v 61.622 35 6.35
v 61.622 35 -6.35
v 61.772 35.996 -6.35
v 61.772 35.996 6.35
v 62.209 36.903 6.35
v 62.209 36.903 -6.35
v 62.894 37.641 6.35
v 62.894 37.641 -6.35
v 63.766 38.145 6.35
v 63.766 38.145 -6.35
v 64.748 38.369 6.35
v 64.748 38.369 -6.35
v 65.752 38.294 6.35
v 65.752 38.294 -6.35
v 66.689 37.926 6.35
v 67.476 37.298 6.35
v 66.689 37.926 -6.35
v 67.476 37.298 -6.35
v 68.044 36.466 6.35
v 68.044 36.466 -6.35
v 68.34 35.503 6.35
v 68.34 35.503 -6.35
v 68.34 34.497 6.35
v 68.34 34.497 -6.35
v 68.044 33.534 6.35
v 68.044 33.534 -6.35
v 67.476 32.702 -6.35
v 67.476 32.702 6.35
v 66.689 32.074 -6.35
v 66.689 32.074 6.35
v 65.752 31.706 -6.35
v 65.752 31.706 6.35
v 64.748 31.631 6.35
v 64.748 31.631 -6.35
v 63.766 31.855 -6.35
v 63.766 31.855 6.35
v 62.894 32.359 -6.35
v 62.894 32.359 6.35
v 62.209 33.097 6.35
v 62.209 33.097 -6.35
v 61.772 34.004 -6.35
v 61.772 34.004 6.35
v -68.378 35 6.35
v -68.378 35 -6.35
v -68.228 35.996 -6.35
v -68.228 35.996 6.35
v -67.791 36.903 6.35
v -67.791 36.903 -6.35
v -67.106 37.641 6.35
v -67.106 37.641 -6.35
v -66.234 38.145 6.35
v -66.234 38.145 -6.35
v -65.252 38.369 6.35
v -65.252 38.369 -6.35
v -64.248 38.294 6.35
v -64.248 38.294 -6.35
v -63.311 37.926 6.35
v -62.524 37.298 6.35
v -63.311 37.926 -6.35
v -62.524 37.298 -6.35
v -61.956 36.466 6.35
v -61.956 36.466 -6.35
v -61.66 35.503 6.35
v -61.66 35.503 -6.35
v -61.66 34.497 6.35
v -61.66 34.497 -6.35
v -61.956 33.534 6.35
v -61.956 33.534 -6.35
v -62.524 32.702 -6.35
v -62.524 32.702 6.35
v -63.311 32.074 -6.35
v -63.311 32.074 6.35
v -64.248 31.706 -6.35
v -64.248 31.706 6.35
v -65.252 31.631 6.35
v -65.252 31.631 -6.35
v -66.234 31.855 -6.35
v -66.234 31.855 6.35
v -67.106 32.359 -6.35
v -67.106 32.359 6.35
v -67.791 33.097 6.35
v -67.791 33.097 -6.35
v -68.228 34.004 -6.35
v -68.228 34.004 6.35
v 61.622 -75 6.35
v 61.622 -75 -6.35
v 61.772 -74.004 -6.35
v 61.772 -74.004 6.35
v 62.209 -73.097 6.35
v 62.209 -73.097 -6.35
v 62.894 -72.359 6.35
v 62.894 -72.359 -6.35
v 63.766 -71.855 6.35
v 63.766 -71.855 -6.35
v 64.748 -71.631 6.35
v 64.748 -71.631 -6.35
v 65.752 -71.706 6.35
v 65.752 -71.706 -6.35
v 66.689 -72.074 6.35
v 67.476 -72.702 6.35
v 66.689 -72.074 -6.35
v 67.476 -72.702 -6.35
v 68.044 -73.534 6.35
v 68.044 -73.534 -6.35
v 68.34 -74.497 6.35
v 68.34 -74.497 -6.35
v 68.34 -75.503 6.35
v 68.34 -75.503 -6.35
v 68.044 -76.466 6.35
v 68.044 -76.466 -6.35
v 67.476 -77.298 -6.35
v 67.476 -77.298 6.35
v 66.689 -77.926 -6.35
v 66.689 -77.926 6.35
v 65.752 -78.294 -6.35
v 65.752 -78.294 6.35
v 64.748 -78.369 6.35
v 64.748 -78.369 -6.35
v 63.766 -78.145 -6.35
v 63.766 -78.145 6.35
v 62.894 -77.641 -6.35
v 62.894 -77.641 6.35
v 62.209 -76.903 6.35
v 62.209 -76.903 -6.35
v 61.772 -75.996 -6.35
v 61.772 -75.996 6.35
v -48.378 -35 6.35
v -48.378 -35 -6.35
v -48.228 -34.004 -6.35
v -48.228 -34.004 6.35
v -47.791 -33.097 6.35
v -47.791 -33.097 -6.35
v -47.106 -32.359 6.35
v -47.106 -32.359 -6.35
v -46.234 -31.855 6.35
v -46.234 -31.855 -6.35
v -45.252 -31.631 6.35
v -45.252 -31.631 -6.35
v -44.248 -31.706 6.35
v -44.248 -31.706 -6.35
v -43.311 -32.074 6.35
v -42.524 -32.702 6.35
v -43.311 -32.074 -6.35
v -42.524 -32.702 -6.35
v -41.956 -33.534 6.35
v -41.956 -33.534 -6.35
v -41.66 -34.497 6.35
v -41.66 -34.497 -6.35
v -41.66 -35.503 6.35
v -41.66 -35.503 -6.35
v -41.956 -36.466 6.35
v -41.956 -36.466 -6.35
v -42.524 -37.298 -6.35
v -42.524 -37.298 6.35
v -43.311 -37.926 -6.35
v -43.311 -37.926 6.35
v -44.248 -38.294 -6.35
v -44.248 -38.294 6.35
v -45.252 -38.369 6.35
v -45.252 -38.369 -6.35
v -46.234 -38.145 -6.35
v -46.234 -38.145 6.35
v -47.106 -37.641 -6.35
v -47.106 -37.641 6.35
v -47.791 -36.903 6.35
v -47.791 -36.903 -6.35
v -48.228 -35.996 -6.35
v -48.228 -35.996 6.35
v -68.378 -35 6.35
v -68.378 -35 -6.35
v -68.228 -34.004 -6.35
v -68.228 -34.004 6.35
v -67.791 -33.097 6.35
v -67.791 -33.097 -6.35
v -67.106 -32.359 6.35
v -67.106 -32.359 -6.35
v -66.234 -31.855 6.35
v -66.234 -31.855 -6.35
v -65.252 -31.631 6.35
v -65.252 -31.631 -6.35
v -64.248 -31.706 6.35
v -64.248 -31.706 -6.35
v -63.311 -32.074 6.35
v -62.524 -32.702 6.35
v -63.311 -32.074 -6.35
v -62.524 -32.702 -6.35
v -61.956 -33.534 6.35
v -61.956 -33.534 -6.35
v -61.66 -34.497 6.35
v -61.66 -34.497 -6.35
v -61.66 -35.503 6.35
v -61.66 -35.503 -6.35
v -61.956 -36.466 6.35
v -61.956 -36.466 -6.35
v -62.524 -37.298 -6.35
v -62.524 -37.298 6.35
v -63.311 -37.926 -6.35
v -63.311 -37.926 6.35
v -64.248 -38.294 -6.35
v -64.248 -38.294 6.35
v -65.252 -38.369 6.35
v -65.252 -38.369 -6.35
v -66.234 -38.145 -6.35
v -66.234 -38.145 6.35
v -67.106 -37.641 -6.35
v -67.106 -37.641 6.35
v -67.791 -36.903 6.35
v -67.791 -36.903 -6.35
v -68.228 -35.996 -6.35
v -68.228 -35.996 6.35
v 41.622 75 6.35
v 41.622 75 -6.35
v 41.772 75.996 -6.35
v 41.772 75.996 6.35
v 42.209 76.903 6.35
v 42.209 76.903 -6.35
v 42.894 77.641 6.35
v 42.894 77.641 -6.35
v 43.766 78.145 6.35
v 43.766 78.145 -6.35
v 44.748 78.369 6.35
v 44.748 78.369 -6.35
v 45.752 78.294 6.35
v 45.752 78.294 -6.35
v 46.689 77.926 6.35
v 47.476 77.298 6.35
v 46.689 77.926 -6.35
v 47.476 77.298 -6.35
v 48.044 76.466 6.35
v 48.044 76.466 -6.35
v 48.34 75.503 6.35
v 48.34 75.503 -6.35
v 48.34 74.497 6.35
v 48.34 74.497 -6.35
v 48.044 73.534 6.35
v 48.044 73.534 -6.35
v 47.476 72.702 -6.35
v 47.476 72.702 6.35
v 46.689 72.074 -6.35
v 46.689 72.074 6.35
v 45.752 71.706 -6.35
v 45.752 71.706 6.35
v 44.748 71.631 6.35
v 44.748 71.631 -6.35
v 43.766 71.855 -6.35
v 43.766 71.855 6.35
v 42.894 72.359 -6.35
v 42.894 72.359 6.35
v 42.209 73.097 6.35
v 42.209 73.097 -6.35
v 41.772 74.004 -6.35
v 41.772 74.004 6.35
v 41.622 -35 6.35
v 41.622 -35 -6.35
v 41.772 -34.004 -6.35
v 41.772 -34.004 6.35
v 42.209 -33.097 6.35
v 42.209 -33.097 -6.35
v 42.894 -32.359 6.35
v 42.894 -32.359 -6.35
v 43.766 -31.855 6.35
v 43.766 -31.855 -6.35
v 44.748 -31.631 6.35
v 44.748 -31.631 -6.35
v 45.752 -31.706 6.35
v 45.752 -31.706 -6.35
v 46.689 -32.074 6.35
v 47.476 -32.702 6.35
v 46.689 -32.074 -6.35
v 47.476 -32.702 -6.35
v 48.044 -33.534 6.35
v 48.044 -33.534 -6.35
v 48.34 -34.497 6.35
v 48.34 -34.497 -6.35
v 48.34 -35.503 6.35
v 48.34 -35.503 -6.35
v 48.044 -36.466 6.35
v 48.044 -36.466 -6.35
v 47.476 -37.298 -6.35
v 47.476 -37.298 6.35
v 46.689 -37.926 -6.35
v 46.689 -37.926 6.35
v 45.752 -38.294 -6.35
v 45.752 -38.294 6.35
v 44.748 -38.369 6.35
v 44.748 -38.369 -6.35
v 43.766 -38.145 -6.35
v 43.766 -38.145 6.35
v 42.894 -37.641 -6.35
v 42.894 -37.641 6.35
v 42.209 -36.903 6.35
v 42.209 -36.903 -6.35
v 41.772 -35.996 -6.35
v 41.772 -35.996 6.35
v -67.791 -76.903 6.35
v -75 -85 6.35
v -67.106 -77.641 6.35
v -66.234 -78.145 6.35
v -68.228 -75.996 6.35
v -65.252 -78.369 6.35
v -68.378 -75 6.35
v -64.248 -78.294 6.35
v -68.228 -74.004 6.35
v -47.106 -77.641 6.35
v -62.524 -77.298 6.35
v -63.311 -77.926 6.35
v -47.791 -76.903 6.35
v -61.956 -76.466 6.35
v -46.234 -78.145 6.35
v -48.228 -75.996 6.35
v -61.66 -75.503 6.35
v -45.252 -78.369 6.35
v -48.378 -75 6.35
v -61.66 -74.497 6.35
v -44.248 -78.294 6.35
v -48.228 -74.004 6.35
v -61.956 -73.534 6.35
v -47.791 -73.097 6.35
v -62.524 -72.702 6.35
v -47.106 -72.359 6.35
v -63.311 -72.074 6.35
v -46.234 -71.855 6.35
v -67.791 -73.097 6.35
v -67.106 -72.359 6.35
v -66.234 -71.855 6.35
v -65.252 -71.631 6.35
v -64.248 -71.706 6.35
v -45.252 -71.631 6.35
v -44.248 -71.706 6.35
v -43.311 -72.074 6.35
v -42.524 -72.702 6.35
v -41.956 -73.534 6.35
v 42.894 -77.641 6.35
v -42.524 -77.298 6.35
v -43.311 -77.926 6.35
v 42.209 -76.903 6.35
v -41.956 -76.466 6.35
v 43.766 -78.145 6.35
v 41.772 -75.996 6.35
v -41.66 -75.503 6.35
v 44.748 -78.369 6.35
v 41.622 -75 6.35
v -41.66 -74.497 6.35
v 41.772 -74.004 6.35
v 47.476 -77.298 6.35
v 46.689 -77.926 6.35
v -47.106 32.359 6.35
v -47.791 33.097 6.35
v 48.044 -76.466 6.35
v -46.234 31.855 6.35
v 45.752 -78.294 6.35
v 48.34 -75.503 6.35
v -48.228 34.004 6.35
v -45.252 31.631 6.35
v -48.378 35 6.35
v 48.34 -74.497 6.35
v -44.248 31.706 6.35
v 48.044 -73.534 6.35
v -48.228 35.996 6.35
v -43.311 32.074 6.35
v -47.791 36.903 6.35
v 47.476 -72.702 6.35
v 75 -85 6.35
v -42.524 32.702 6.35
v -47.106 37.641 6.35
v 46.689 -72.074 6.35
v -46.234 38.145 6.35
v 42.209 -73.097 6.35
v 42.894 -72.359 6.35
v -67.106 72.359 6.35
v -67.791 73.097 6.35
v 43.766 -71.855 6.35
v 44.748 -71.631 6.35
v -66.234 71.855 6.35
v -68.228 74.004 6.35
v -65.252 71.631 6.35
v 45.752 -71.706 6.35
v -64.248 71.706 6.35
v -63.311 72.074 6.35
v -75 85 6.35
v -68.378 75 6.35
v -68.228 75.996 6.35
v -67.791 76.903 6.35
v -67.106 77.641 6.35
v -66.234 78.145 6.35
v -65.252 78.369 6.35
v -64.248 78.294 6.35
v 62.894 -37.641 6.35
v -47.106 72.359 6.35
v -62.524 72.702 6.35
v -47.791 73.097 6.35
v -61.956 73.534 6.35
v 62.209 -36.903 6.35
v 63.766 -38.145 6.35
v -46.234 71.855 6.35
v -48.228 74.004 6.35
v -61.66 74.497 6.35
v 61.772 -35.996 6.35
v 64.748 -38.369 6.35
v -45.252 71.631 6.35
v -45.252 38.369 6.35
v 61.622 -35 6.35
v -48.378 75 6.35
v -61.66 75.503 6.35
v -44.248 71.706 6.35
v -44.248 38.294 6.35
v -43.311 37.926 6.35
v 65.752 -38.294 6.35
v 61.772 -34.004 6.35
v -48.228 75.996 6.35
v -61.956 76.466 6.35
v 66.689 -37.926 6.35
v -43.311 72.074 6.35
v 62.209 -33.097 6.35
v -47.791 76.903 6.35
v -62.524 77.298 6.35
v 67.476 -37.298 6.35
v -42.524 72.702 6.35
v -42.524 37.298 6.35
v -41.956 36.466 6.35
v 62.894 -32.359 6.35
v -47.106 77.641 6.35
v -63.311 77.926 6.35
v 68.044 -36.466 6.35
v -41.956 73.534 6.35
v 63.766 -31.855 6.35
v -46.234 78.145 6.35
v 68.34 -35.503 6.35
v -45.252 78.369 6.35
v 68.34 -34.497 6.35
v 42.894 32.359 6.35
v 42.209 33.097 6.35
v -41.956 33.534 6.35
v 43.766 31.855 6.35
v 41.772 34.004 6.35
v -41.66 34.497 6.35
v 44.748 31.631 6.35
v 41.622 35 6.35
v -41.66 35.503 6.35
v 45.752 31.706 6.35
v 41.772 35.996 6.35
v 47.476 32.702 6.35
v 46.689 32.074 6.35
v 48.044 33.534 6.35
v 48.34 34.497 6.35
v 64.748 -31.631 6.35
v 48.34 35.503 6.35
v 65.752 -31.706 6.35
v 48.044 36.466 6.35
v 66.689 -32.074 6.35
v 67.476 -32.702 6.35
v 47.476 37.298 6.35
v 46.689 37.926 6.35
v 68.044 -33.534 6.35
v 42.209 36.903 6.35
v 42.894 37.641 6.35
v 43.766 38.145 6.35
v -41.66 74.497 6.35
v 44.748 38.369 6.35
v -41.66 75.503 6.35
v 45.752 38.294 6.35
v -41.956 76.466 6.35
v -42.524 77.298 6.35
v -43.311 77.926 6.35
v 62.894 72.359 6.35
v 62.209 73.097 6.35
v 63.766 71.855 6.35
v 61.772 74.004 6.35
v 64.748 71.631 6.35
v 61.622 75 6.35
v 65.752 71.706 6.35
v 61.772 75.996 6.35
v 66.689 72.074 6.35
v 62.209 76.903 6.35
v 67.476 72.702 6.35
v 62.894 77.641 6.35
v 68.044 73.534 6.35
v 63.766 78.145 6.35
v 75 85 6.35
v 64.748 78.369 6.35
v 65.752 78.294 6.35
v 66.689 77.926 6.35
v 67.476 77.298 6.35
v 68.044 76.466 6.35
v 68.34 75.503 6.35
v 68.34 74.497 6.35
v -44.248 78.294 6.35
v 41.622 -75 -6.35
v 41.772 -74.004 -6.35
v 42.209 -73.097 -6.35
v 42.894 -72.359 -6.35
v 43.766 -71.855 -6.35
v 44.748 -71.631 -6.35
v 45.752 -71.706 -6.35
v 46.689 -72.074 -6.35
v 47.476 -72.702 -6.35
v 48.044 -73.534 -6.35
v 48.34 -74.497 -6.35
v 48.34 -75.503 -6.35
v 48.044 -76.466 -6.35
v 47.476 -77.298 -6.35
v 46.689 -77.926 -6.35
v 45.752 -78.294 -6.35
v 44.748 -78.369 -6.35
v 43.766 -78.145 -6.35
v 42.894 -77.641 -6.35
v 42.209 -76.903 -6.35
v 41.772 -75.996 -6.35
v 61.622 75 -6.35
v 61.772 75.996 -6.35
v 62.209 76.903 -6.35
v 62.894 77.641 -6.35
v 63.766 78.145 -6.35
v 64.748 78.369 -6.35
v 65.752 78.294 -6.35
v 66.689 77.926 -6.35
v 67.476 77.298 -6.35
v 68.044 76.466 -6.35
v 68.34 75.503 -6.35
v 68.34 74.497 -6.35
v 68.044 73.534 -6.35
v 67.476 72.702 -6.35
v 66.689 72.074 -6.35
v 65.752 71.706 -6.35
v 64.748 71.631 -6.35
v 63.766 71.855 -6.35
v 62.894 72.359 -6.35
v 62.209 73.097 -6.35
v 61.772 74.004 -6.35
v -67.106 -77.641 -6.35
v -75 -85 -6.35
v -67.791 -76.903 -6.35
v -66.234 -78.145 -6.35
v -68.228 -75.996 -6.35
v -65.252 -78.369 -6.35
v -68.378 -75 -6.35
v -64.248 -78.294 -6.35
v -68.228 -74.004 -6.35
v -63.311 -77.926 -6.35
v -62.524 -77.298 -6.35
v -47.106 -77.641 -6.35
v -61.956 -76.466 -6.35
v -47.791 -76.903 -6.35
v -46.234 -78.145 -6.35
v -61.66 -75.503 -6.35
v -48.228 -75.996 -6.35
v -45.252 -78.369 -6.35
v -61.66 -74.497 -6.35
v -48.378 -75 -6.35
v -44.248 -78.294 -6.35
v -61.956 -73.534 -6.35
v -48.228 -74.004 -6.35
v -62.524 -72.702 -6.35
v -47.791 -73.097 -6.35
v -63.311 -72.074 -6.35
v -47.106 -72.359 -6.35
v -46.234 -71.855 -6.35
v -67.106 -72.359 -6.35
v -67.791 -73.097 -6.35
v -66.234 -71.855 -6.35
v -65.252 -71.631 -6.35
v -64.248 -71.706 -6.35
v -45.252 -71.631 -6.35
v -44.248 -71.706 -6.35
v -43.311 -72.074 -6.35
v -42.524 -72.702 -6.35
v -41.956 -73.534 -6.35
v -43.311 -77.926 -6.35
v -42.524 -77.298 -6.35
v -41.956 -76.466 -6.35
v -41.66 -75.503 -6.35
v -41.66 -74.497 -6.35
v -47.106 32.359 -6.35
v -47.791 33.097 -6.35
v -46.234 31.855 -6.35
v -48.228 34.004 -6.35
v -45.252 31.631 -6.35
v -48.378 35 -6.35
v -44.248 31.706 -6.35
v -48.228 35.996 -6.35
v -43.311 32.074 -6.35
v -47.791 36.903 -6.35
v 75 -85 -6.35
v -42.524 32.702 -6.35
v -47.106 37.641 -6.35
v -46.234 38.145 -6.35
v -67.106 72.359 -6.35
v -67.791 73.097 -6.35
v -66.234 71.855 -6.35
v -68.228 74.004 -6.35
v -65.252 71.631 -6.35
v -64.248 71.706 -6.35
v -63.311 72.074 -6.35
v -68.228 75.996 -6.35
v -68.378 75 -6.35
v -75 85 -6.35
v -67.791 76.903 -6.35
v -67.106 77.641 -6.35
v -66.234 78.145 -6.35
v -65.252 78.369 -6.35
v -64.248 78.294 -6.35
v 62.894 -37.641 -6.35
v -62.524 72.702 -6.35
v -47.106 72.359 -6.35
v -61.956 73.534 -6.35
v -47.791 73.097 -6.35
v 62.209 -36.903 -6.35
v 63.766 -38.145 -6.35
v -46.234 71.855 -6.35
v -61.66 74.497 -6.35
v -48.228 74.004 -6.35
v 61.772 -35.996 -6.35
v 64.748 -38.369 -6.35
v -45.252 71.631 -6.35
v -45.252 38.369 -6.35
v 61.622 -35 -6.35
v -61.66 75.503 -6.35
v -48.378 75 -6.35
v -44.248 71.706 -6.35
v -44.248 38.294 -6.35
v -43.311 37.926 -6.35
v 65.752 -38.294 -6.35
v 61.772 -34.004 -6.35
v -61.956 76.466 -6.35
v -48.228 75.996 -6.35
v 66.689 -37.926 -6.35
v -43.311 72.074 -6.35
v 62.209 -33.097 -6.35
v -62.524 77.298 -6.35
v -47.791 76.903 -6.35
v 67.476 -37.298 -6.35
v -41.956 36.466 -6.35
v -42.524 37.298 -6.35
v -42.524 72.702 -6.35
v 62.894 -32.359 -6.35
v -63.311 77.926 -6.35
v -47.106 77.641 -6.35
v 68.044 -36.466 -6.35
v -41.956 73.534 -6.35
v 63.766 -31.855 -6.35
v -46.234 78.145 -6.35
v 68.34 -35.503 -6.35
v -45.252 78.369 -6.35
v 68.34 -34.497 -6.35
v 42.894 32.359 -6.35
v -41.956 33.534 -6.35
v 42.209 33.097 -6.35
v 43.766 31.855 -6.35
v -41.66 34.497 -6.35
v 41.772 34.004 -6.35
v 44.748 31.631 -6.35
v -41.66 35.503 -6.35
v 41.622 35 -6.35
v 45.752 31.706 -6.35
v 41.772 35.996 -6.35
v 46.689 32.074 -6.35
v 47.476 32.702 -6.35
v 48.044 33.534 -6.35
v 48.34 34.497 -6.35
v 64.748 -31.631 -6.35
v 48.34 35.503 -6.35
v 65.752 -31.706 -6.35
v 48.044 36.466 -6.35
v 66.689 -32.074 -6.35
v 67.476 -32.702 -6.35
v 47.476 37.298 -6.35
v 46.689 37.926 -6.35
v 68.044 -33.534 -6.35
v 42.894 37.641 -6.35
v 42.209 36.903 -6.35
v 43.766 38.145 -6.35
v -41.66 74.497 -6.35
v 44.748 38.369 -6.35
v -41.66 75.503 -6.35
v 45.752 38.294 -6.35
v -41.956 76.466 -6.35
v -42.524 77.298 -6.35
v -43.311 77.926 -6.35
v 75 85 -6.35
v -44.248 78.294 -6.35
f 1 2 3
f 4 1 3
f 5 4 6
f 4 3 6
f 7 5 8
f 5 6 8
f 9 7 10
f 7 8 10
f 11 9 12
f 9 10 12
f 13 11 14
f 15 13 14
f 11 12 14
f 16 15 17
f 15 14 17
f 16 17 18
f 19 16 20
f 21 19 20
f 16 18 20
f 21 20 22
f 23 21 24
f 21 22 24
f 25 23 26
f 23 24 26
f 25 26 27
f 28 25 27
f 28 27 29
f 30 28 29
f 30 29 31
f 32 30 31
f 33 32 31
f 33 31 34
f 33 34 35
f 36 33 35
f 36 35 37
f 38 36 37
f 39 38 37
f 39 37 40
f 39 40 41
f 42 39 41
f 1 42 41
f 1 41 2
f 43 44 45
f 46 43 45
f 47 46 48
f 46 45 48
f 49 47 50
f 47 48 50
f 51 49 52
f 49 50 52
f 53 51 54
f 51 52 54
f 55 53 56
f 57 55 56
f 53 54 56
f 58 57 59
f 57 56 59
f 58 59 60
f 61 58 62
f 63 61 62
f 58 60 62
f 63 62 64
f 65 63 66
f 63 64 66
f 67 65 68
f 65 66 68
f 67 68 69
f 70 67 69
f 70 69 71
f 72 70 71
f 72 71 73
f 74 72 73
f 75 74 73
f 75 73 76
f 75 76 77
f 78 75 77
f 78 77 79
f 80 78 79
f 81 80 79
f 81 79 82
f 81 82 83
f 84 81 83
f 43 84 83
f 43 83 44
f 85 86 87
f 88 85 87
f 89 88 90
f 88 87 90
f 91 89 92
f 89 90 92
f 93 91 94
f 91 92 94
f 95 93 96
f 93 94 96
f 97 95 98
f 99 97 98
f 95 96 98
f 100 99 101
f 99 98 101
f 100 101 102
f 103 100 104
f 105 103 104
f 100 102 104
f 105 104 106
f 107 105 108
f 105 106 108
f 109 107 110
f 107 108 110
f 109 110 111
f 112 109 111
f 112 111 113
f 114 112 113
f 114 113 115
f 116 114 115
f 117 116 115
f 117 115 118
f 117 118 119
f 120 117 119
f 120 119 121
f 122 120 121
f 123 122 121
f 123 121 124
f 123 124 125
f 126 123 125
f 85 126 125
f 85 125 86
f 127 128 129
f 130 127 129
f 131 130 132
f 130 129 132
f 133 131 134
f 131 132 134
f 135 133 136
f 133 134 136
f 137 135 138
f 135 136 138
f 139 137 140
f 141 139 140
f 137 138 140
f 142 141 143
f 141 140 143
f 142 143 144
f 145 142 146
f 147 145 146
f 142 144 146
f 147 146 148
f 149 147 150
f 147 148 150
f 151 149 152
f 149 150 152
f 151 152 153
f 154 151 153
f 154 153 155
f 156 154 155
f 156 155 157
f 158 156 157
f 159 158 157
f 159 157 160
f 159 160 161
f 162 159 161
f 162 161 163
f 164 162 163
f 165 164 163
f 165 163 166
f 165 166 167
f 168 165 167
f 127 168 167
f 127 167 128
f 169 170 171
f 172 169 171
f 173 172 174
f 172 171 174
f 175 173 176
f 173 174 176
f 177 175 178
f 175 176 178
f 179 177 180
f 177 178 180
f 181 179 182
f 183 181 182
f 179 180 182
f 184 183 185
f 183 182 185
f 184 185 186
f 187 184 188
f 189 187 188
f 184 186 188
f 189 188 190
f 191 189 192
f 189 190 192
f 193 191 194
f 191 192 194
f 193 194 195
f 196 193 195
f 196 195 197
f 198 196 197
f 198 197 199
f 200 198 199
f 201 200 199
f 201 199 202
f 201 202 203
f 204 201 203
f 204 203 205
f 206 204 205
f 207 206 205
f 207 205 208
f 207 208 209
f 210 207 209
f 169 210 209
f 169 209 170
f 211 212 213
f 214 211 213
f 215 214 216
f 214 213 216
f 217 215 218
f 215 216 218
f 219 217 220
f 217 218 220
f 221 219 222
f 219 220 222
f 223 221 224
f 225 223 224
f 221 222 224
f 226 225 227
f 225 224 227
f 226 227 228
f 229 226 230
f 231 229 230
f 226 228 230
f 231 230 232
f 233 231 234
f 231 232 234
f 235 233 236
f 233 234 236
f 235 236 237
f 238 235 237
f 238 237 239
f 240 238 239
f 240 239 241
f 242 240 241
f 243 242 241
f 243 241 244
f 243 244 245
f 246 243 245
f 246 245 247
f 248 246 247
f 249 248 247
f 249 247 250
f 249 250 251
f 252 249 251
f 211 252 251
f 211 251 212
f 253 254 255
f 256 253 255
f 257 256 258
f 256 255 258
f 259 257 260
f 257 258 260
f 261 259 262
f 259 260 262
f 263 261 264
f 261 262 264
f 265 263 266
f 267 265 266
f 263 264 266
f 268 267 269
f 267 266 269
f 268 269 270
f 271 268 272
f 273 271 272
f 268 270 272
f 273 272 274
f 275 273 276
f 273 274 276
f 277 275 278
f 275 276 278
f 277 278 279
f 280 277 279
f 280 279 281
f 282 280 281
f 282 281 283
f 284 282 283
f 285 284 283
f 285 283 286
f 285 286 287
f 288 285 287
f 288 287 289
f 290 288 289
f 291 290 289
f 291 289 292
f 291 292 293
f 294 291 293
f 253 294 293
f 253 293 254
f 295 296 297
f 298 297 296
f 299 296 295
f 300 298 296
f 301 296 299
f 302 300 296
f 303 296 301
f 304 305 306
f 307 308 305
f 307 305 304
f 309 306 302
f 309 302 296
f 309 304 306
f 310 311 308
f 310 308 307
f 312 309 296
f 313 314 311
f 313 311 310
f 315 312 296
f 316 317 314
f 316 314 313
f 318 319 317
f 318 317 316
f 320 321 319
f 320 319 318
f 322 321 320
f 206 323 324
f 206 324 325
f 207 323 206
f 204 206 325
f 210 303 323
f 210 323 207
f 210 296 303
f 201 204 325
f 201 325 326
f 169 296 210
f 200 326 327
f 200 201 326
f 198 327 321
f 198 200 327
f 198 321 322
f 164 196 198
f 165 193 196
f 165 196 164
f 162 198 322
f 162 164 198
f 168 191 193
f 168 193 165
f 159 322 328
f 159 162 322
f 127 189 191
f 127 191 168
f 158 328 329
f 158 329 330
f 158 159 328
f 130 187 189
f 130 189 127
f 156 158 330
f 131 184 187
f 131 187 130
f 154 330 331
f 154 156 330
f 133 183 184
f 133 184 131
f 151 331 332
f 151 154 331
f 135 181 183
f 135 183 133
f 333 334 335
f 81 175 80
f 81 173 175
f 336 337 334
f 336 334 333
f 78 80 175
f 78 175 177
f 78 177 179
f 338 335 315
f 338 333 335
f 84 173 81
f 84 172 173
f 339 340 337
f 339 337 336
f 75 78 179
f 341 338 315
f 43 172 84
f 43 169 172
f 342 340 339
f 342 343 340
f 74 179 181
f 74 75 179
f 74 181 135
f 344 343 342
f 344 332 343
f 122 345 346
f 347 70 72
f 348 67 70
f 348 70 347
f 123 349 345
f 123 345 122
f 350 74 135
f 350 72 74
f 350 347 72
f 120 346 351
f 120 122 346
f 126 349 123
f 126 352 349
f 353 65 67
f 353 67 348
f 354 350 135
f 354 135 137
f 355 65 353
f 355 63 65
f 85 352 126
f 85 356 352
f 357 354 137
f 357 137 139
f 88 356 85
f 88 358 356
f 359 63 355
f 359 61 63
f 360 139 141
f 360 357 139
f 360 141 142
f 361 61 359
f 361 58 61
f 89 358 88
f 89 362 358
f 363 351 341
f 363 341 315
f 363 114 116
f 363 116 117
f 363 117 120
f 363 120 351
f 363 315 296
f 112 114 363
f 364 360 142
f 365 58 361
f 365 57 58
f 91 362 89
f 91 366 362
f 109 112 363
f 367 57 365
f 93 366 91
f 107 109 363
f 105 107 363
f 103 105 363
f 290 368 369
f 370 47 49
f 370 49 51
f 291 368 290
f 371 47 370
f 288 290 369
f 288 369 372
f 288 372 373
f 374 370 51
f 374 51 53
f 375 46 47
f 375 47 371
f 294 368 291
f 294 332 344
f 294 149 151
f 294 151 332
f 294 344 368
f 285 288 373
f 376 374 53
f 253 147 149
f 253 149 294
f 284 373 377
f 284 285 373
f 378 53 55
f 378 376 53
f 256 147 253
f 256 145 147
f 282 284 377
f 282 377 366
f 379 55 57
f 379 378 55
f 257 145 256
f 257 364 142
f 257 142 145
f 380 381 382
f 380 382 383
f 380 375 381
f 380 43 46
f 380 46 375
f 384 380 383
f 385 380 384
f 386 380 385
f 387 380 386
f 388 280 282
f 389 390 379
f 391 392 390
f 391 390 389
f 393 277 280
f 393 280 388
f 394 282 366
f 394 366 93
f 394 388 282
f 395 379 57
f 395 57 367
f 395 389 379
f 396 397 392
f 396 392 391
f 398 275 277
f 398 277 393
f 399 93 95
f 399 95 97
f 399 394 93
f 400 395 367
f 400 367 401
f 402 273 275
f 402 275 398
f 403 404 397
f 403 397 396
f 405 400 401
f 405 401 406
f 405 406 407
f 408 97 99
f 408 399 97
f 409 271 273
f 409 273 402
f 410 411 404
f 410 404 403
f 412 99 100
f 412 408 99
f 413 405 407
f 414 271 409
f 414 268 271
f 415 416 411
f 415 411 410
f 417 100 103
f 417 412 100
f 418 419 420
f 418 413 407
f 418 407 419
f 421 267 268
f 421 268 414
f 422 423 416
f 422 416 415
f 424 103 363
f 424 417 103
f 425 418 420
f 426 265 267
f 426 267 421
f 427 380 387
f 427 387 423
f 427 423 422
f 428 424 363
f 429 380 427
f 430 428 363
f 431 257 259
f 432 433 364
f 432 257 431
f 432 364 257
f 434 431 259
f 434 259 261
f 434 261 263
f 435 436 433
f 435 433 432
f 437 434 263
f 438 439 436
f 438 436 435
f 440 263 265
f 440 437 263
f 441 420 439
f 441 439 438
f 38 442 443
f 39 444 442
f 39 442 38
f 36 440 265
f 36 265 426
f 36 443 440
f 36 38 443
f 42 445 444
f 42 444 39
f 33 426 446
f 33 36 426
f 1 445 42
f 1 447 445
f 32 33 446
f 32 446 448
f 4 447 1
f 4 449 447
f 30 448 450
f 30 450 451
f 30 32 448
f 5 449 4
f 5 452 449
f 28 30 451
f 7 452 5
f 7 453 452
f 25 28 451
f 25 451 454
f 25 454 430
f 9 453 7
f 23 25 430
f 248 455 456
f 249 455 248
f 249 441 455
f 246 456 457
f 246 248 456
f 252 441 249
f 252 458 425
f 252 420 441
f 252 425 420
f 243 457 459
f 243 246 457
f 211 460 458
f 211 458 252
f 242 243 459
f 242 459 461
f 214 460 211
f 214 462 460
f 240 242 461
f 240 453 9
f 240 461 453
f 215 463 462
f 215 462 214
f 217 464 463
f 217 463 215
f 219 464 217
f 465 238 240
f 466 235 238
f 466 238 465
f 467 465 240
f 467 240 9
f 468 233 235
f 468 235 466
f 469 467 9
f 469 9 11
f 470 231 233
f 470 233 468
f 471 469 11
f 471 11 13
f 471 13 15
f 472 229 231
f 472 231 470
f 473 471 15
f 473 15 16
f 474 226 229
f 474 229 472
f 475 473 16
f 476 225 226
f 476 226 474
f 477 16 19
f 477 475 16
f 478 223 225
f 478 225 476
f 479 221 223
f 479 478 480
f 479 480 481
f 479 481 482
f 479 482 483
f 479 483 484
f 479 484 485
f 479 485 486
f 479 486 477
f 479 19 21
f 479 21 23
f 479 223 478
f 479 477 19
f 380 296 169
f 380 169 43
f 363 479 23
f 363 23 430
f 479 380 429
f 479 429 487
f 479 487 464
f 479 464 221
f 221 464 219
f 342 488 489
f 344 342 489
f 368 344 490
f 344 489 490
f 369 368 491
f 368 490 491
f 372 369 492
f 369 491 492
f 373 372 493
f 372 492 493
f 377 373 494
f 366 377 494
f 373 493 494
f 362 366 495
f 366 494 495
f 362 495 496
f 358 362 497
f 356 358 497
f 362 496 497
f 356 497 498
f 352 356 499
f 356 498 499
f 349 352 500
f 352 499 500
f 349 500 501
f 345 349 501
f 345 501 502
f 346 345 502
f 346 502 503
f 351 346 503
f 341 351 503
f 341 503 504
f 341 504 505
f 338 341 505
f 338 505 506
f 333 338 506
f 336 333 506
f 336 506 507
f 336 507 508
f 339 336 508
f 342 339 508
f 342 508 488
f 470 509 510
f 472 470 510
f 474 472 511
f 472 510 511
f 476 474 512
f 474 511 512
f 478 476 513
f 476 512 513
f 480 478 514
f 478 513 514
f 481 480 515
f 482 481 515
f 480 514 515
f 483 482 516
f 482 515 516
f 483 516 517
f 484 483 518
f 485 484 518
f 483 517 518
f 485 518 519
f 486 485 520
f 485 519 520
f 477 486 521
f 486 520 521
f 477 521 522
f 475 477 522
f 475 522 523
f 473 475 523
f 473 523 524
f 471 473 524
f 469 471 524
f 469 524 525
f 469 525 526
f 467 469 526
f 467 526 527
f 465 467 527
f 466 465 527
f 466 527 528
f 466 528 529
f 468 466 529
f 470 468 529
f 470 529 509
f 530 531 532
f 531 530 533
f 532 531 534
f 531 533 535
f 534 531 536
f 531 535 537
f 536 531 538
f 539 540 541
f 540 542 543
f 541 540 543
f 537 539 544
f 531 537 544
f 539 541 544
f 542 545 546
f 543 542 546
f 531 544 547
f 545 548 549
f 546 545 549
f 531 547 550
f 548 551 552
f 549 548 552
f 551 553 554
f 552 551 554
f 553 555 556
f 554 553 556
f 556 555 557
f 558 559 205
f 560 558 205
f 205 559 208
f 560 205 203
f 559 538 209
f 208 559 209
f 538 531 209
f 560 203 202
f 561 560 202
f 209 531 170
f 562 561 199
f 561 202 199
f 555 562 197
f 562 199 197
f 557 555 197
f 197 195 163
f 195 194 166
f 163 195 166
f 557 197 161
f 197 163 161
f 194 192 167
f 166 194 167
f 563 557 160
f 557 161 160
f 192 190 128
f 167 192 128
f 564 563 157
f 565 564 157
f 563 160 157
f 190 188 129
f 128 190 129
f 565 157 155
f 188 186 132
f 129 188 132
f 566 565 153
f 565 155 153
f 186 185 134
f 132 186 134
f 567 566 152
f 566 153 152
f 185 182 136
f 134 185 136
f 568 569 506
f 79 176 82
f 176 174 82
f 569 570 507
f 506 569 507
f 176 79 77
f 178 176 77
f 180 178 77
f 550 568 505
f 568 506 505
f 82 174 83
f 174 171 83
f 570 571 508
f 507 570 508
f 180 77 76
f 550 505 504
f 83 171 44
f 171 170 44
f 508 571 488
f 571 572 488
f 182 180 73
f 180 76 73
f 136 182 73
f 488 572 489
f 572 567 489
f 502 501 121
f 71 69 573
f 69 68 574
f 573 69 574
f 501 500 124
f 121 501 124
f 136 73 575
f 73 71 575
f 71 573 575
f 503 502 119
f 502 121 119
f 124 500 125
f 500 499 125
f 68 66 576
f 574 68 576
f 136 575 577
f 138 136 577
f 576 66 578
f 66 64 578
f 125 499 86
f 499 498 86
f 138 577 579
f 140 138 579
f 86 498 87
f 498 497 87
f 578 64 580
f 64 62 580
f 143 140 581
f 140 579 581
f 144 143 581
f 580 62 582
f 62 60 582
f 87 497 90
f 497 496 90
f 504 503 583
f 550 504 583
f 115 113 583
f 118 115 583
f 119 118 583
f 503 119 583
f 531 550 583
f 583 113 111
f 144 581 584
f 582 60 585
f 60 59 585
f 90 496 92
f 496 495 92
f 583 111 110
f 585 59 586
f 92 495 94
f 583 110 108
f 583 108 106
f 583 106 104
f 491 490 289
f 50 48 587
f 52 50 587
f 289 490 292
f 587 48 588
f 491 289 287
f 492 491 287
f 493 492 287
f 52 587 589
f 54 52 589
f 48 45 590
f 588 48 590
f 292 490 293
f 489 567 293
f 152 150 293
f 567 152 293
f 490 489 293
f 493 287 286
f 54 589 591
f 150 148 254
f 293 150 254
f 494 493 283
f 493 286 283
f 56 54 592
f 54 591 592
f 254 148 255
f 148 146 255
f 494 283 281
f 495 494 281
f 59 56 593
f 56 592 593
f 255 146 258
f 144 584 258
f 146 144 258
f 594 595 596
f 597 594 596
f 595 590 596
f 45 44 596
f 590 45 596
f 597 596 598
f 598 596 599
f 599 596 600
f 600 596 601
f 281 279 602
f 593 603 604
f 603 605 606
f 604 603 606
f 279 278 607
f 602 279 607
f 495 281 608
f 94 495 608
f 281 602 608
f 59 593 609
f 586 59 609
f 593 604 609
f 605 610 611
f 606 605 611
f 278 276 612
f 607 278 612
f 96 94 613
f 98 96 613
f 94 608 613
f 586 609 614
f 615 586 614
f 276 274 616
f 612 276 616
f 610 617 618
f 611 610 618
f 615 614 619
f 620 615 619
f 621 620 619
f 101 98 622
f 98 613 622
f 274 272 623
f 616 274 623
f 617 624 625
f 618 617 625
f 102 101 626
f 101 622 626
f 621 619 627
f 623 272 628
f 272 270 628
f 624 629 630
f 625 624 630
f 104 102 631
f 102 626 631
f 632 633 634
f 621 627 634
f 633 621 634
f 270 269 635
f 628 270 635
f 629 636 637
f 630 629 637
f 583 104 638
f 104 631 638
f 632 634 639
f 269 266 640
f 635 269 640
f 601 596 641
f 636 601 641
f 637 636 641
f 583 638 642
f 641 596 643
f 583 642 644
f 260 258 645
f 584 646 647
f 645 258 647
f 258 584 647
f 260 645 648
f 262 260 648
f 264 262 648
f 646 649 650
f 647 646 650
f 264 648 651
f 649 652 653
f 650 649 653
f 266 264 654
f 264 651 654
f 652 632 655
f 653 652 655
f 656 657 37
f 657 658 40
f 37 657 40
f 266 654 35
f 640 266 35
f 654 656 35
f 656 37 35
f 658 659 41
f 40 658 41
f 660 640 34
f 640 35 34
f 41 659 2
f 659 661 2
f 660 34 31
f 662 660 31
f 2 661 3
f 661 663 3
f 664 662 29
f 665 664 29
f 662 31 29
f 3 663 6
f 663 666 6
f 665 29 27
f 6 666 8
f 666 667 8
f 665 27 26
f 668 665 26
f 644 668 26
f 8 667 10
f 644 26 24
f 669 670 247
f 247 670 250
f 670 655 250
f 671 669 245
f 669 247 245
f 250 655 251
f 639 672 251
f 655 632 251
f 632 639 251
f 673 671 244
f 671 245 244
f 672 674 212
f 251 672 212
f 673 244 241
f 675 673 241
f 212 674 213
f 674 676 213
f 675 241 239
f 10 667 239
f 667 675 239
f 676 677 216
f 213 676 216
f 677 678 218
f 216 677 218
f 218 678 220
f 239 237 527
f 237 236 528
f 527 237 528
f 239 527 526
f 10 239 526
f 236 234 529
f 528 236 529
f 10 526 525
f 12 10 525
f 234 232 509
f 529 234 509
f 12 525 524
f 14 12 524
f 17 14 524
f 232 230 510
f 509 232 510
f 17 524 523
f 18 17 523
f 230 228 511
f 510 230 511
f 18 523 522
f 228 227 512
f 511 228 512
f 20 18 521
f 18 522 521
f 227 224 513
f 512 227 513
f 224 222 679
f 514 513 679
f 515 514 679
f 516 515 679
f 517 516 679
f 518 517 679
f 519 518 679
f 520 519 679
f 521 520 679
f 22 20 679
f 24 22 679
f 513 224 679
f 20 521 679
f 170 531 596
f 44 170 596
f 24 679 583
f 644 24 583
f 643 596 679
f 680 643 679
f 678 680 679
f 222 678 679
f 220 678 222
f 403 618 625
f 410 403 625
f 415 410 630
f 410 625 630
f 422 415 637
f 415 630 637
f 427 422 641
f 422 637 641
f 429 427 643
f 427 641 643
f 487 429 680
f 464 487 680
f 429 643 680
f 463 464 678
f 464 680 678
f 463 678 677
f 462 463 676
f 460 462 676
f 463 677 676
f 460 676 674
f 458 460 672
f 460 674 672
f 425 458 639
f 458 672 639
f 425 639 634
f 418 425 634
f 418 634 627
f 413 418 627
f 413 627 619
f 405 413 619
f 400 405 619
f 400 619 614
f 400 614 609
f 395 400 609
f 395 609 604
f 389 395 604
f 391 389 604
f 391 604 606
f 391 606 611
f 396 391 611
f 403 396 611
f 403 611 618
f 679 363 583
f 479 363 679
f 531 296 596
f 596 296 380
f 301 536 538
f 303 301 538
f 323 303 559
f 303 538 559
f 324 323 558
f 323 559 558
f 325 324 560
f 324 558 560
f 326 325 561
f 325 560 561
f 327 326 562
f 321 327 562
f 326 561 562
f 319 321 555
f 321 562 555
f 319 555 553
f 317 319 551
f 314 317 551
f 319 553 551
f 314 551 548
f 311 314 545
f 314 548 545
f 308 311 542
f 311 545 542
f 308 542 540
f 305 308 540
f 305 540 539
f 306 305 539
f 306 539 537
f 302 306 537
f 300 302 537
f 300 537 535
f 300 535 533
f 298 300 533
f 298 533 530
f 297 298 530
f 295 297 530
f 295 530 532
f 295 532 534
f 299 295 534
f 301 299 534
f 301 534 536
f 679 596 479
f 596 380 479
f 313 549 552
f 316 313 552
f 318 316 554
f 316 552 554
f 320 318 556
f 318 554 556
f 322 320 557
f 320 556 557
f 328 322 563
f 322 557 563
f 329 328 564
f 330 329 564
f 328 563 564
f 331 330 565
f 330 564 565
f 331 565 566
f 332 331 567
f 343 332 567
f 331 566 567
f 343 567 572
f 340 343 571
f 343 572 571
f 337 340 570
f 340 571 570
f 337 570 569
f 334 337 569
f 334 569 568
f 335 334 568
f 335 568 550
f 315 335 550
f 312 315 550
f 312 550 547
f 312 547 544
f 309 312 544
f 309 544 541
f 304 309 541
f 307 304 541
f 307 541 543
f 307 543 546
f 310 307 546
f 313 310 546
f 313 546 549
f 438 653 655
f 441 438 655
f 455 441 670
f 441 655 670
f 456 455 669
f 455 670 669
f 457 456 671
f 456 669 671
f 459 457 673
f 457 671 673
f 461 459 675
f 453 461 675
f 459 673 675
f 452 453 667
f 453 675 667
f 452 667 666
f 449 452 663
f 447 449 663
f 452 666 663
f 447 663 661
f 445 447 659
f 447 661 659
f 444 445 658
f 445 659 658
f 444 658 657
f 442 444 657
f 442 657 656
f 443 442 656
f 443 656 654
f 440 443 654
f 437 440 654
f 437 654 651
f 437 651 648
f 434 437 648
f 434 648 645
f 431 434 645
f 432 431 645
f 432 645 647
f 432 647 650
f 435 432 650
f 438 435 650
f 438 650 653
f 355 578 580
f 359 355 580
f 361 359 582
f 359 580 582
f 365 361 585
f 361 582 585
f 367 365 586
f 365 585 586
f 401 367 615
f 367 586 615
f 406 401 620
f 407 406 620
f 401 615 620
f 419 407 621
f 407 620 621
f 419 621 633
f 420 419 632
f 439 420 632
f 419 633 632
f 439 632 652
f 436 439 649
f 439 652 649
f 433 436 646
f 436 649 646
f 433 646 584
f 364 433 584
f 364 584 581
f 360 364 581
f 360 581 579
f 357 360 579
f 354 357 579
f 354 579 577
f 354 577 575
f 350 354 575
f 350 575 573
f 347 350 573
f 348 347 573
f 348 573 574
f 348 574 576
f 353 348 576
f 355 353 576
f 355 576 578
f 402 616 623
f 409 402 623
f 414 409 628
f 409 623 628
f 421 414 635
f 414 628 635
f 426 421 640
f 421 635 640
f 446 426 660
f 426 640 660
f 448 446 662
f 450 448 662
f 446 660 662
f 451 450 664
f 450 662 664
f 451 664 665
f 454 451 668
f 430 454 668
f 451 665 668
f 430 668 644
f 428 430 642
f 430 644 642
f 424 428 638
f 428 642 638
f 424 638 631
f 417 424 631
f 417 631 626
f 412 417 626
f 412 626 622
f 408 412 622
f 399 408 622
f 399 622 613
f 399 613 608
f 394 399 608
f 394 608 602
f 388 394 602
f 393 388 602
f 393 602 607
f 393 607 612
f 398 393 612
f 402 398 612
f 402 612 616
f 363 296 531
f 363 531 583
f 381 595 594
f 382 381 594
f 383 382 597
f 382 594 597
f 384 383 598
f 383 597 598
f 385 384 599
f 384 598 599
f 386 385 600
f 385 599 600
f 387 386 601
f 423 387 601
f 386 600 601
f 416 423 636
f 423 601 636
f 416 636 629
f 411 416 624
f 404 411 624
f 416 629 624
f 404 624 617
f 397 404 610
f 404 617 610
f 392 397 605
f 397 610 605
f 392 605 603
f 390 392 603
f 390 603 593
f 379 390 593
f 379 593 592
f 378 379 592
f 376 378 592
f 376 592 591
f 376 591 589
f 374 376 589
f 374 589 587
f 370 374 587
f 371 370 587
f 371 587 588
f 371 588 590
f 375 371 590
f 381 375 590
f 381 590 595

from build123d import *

# Parameters (mm, degrees)
CROQUIS1_W                    = 150
CROQUIS1_H                    = 170
SALIENTE_EXTRUIR1_DEPTH       = 6.35
TALADRO_DE_MARGEN_PARA_1_41_D = 6.7564


with BuildPart() as part:
    # Croquis1 → Saliente-Extruir1 (new, symmetric)
    with BuildSketch(Plane.XY):
        Rectangle(CROQUIS1_W, CROQUIS1_H)
    extrude(amount=SALIENTE_EXTRUIR1_DEPTH, both=True)

    # Taladro de margen para 1/41 (through all)
    with Locations(Plane.XY.offset(6.35)):
        with Locations((65, 75), (65, 35), (45, 35), (45, 75), (45, -75), (45, -35), (65, -35), (65, -75), (-65, -75), (-65, -35), (-45, -35), (-45, -75), (-45, 75), (-45, 35), (-65, 35), (-65, 75)):
            Hole(TALADRO_DE_MARGEN_PARA_1_41_D / 2)


solid = part.part
